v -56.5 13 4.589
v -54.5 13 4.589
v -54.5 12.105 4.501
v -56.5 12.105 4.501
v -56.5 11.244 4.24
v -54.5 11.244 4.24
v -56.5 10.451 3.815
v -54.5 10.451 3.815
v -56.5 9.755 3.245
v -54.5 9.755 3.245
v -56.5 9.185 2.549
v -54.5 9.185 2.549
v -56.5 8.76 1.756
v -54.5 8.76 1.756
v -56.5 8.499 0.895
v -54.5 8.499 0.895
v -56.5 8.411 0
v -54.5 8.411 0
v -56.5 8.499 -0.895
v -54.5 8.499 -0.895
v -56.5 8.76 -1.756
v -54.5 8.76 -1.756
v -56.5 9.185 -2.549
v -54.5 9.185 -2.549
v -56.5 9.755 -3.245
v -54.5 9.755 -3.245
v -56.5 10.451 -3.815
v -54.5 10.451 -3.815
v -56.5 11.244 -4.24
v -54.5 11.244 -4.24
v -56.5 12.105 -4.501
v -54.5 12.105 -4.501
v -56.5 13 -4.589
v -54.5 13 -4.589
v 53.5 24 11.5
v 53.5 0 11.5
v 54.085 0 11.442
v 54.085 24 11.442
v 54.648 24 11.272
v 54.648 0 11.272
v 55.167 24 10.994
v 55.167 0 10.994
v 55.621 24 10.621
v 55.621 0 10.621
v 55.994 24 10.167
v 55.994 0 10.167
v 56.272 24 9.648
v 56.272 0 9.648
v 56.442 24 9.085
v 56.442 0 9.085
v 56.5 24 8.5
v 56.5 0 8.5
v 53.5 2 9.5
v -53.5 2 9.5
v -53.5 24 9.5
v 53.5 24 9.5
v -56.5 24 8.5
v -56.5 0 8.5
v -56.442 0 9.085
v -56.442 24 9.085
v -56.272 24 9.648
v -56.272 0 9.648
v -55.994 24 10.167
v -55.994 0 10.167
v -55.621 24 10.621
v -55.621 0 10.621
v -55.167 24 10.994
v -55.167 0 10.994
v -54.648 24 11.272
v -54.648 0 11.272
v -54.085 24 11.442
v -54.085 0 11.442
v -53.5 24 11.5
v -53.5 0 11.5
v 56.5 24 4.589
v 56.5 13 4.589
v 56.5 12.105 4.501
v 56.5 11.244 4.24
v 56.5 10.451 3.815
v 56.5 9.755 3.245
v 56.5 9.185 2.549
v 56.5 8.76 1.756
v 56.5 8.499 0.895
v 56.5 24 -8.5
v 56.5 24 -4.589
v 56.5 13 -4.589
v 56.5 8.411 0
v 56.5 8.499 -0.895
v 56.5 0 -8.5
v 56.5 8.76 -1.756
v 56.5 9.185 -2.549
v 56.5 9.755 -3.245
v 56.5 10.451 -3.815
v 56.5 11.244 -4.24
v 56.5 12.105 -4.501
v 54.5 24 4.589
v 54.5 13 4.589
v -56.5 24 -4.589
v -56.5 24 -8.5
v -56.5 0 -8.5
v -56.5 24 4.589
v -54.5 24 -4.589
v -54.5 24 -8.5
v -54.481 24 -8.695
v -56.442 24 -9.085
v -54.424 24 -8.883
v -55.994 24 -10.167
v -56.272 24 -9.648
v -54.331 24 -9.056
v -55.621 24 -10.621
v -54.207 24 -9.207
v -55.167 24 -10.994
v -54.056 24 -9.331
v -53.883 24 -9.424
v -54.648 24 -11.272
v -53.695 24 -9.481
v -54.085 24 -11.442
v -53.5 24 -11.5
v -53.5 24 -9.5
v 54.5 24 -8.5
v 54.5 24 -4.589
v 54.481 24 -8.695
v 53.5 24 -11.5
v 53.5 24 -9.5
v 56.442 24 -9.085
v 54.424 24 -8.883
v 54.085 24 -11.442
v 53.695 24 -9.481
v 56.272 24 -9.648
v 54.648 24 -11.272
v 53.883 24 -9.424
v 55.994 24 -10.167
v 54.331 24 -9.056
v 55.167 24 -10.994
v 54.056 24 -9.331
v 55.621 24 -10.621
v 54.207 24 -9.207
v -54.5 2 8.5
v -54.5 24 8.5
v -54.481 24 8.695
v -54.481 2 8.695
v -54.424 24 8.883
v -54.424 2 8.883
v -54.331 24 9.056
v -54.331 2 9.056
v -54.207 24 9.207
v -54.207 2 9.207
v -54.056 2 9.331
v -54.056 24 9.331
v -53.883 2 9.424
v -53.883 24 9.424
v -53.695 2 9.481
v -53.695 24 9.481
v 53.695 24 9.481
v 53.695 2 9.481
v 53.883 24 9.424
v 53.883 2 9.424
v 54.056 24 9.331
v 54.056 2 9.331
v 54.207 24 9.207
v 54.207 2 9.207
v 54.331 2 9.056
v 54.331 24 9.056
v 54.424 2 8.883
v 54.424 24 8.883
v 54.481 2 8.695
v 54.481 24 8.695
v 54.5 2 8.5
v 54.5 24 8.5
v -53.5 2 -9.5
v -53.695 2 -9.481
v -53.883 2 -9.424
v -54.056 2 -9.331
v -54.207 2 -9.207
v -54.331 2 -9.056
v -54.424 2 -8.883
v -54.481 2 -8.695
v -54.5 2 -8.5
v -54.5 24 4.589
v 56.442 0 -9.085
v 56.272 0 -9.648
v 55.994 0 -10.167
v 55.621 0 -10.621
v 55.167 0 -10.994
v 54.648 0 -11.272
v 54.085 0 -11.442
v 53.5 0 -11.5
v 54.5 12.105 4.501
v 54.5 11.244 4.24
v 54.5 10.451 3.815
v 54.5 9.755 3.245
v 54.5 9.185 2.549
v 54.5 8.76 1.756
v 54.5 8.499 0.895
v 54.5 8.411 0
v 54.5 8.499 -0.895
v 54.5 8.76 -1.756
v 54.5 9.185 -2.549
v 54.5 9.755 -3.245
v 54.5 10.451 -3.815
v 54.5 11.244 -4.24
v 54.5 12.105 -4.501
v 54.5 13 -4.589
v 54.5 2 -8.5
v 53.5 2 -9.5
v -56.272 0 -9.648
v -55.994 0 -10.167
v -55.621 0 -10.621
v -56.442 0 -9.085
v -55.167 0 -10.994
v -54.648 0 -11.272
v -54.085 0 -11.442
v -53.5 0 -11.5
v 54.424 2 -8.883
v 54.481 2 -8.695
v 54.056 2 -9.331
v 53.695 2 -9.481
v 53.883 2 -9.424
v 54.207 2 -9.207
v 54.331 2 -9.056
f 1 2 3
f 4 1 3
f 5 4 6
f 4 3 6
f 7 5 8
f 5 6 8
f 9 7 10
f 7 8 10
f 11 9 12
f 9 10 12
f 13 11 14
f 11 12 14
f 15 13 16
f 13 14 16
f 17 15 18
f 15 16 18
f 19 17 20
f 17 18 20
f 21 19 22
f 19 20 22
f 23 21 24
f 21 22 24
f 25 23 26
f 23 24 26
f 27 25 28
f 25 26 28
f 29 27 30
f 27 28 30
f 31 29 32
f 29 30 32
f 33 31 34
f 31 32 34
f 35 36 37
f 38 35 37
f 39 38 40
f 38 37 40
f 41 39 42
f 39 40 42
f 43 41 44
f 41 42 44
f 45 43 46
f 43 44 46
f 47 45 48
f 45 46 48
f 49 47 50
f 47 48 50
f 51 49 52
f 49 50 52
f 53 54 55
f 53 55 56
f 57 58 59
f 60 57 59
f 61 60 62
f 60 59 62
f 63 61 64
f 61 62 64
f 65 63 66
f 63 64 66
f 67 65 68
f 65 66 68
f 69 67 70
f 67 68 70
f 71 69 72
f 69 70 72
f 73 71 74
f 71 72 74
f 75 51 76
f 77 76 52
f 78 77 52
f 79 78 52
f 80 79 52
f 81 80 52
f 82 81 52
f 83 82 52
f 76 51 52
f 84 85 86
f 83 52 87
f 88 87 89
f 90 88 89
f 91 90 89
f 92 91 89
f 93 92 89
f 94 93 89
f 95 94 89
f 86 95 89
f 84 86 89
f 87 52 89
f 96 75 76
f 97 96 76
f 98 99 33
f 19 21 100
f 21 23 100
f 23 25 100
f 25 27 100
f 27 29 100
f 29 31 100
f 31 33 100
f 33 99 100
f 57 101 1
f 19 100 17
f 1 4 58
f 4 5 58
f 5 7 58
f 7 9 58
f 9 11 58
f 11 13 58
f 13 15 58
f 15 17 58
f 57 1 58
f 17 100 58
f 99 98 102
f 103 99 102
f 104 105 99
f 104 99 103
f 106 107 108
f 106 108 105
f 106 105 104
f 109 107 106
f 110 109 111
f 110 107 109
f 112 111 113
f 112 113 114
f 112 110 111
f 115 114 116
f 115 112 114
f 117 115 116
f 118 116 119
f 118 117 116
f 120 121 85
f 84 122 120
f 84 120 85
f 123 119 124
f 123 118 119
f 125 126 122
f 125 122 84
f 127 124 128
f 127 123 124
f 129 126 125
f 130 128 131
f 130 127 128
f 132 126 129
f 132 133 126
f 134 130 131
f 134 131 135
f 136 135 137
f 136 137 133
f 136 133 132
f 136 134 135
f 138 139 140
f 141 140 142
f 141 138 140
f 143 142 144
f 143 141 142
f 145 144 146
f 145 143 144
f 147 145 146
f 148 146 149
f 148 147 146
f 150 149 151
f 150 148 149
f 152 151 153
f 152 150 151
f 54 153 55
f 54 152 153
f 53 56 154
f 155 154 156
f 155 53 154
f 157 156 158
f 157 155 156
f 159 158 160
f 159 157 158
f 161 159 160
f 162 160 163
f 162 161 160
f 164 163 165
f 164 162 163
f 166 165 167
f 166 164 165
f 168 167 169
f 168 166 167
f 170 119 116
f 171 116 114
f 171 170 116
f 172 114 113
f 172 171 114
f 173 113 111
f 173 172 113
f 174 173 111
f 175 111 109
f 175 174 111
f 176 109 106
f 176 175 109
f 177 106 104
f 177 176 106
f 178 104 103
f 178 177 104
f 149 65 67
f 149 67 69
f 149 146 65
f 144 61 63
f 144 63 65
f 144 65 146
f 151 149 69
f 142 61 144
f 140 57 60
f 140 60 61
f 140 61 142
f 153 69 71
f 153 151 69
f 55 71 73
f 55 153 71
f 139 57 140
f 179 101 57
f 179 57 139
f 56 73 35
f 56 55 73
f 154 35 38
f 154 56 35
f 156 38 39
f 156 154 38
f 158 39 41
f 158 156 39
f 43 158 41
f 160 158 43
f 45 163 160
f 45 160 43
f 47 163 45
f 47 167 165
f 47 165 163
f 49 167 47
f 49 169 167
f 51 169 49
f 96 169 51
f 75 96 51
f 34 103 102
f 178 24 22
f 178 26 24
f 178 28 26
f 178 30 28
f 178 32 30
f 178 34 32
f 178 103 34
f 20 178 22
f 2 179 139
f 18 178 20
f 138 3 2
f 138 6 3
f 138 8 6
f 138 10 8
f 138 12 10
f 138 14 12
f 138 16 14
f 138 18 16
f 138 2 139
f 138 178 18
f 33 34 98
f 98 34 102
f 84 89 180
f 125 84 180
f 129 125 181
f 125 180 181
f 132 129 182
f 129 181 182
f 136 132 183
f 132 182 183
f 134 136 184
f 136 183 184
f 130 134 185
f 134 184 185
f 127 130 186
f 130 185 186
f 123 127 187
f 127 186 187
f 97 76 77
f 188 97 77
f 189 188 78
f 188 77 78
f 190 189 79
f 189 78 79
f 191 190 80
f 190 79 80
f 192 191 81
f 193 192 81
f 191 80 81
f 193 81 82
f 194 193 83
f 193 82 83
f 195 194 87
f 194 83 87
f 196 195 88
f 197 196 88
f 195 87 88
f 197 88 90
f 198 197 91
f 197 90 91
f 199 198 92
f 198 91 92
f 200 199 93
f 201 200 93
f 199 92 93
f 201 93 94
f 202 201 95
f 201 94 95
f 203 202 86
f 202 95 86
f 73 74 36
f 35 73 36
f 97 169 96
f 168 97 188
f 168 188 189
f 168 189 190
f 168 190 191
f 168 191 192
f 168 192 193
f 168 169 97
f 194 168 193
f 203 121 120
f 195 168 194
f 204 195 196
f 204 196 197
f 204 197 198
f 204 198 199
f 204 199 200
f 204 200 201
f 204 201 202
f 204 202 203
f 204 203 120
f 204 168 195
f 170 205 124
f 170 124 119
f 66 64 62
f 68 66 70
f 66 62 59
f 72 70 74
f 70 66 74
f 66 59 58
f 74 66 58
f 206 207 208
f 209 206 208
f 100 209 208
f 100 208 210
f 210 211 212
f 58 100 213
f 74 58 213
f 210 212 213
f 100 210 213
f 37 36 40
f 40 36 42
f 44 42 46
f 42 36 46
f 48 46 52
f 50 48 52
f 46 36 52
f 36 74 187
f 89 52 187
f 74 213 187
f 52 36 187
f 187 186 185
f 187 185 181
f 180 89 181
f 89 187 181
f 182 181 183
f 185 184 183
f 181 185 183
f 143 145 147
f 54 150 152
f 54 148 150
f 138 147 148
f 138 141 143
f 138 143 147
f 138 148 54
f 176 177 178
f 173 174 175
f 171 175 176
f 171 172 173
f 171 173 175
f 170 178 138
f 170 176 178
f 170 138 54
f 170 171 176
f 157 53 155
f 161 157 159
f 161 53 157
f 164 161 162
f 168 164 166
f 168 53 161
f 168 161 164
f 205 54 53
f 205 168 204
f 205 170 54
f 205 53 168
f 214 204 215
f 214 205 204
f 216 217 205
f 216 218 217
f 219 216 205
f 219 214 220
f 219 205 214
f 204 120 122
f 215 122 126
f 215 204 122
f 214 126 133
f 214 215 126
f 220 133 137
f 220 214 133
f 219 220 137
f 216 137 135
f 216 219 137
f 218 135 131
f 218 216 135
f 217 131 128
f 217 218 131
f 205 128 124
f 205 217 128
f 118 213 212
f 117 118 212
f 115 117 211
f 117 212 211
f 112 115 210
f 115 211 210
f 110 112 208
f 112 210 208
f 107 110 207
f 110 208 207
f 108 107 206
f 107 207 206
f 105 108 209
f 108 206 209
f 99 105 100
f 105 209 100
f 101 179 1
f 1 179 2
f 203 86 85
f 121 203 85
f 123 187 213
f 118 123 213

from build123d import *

# Parameters (mm, degrees)
BOSS_EXTRUDE1_DEPTH = 24
SHELL2_T            = -2
CUT_EXTRUDE1_DEPTH  = 117.091558694


with BuildPart() as part:
    # Sketch1 → Boss-Extrude1 (new body)
    with BuildSketch(Plane(origin=(0, 0, 0), x_dir=(1, 0, 0), z_dir=(0, 1, 0))):
        with BuildLine():
            Line((-53.5, -11.5), (53.5, -11.5))
            ThreePointArc((53.5, -11.5), (55.621320344, -10.621320344), (56.5, -8.5))
            Line((56.5, -8.5), (56.5, 8.5))
            ThreePointArc((56.5, 8.5), (55.621320344, 10.621320344), (53.5, 11.5))
            Line((53.5, 11.5), (-53.5, 11.5))
            ThreePointArc((-53.5, 11.5), (-55.621320344, 10.621320344), (-56.5, 8.5))
            Line((-56.5, 8.5), (-56.5, -8.5))
            ThreePointArc((-56.5, -8.5), (-55.621320344, -10.621320344), (-53.5, -11.5))
        make_face()
    extrude(amount=BOSS_EXTRUDE1_DEPTH)

    # Shell2
    shell2_openings = [part.faces().sort_by_distance(p)[0] for p in [
        (0, 24, 0),
    ]]
    offset(amount=SHELL2_T, openings=shell2_openings, kind=Kind.INTERSECTION)

    # Sketch4 → Cut-Extrude1 (cut, through all)
    with BuildSketch(Plane(origin=(56.5, 0, 0), x_dir=(0, 0, -1), z_dir=(1, 0, 0))):
        with BuildLine():
            Line((-4.588804417, 24), (-4.588804417, 13))
            ThreePointArc((-4.588804417, 13), (0, 8.411195583), (4.588804417, 13))
            Line((4.588804417, 13), (4.588804417, 24))
            Line((4.588804417, 24), (-4.588804417, 24))
        make_face()
    extrude(amount=-CUT_EXTRUDE1_DEPTH, mode=Mode.SUBTRACT)


solid = part.part
